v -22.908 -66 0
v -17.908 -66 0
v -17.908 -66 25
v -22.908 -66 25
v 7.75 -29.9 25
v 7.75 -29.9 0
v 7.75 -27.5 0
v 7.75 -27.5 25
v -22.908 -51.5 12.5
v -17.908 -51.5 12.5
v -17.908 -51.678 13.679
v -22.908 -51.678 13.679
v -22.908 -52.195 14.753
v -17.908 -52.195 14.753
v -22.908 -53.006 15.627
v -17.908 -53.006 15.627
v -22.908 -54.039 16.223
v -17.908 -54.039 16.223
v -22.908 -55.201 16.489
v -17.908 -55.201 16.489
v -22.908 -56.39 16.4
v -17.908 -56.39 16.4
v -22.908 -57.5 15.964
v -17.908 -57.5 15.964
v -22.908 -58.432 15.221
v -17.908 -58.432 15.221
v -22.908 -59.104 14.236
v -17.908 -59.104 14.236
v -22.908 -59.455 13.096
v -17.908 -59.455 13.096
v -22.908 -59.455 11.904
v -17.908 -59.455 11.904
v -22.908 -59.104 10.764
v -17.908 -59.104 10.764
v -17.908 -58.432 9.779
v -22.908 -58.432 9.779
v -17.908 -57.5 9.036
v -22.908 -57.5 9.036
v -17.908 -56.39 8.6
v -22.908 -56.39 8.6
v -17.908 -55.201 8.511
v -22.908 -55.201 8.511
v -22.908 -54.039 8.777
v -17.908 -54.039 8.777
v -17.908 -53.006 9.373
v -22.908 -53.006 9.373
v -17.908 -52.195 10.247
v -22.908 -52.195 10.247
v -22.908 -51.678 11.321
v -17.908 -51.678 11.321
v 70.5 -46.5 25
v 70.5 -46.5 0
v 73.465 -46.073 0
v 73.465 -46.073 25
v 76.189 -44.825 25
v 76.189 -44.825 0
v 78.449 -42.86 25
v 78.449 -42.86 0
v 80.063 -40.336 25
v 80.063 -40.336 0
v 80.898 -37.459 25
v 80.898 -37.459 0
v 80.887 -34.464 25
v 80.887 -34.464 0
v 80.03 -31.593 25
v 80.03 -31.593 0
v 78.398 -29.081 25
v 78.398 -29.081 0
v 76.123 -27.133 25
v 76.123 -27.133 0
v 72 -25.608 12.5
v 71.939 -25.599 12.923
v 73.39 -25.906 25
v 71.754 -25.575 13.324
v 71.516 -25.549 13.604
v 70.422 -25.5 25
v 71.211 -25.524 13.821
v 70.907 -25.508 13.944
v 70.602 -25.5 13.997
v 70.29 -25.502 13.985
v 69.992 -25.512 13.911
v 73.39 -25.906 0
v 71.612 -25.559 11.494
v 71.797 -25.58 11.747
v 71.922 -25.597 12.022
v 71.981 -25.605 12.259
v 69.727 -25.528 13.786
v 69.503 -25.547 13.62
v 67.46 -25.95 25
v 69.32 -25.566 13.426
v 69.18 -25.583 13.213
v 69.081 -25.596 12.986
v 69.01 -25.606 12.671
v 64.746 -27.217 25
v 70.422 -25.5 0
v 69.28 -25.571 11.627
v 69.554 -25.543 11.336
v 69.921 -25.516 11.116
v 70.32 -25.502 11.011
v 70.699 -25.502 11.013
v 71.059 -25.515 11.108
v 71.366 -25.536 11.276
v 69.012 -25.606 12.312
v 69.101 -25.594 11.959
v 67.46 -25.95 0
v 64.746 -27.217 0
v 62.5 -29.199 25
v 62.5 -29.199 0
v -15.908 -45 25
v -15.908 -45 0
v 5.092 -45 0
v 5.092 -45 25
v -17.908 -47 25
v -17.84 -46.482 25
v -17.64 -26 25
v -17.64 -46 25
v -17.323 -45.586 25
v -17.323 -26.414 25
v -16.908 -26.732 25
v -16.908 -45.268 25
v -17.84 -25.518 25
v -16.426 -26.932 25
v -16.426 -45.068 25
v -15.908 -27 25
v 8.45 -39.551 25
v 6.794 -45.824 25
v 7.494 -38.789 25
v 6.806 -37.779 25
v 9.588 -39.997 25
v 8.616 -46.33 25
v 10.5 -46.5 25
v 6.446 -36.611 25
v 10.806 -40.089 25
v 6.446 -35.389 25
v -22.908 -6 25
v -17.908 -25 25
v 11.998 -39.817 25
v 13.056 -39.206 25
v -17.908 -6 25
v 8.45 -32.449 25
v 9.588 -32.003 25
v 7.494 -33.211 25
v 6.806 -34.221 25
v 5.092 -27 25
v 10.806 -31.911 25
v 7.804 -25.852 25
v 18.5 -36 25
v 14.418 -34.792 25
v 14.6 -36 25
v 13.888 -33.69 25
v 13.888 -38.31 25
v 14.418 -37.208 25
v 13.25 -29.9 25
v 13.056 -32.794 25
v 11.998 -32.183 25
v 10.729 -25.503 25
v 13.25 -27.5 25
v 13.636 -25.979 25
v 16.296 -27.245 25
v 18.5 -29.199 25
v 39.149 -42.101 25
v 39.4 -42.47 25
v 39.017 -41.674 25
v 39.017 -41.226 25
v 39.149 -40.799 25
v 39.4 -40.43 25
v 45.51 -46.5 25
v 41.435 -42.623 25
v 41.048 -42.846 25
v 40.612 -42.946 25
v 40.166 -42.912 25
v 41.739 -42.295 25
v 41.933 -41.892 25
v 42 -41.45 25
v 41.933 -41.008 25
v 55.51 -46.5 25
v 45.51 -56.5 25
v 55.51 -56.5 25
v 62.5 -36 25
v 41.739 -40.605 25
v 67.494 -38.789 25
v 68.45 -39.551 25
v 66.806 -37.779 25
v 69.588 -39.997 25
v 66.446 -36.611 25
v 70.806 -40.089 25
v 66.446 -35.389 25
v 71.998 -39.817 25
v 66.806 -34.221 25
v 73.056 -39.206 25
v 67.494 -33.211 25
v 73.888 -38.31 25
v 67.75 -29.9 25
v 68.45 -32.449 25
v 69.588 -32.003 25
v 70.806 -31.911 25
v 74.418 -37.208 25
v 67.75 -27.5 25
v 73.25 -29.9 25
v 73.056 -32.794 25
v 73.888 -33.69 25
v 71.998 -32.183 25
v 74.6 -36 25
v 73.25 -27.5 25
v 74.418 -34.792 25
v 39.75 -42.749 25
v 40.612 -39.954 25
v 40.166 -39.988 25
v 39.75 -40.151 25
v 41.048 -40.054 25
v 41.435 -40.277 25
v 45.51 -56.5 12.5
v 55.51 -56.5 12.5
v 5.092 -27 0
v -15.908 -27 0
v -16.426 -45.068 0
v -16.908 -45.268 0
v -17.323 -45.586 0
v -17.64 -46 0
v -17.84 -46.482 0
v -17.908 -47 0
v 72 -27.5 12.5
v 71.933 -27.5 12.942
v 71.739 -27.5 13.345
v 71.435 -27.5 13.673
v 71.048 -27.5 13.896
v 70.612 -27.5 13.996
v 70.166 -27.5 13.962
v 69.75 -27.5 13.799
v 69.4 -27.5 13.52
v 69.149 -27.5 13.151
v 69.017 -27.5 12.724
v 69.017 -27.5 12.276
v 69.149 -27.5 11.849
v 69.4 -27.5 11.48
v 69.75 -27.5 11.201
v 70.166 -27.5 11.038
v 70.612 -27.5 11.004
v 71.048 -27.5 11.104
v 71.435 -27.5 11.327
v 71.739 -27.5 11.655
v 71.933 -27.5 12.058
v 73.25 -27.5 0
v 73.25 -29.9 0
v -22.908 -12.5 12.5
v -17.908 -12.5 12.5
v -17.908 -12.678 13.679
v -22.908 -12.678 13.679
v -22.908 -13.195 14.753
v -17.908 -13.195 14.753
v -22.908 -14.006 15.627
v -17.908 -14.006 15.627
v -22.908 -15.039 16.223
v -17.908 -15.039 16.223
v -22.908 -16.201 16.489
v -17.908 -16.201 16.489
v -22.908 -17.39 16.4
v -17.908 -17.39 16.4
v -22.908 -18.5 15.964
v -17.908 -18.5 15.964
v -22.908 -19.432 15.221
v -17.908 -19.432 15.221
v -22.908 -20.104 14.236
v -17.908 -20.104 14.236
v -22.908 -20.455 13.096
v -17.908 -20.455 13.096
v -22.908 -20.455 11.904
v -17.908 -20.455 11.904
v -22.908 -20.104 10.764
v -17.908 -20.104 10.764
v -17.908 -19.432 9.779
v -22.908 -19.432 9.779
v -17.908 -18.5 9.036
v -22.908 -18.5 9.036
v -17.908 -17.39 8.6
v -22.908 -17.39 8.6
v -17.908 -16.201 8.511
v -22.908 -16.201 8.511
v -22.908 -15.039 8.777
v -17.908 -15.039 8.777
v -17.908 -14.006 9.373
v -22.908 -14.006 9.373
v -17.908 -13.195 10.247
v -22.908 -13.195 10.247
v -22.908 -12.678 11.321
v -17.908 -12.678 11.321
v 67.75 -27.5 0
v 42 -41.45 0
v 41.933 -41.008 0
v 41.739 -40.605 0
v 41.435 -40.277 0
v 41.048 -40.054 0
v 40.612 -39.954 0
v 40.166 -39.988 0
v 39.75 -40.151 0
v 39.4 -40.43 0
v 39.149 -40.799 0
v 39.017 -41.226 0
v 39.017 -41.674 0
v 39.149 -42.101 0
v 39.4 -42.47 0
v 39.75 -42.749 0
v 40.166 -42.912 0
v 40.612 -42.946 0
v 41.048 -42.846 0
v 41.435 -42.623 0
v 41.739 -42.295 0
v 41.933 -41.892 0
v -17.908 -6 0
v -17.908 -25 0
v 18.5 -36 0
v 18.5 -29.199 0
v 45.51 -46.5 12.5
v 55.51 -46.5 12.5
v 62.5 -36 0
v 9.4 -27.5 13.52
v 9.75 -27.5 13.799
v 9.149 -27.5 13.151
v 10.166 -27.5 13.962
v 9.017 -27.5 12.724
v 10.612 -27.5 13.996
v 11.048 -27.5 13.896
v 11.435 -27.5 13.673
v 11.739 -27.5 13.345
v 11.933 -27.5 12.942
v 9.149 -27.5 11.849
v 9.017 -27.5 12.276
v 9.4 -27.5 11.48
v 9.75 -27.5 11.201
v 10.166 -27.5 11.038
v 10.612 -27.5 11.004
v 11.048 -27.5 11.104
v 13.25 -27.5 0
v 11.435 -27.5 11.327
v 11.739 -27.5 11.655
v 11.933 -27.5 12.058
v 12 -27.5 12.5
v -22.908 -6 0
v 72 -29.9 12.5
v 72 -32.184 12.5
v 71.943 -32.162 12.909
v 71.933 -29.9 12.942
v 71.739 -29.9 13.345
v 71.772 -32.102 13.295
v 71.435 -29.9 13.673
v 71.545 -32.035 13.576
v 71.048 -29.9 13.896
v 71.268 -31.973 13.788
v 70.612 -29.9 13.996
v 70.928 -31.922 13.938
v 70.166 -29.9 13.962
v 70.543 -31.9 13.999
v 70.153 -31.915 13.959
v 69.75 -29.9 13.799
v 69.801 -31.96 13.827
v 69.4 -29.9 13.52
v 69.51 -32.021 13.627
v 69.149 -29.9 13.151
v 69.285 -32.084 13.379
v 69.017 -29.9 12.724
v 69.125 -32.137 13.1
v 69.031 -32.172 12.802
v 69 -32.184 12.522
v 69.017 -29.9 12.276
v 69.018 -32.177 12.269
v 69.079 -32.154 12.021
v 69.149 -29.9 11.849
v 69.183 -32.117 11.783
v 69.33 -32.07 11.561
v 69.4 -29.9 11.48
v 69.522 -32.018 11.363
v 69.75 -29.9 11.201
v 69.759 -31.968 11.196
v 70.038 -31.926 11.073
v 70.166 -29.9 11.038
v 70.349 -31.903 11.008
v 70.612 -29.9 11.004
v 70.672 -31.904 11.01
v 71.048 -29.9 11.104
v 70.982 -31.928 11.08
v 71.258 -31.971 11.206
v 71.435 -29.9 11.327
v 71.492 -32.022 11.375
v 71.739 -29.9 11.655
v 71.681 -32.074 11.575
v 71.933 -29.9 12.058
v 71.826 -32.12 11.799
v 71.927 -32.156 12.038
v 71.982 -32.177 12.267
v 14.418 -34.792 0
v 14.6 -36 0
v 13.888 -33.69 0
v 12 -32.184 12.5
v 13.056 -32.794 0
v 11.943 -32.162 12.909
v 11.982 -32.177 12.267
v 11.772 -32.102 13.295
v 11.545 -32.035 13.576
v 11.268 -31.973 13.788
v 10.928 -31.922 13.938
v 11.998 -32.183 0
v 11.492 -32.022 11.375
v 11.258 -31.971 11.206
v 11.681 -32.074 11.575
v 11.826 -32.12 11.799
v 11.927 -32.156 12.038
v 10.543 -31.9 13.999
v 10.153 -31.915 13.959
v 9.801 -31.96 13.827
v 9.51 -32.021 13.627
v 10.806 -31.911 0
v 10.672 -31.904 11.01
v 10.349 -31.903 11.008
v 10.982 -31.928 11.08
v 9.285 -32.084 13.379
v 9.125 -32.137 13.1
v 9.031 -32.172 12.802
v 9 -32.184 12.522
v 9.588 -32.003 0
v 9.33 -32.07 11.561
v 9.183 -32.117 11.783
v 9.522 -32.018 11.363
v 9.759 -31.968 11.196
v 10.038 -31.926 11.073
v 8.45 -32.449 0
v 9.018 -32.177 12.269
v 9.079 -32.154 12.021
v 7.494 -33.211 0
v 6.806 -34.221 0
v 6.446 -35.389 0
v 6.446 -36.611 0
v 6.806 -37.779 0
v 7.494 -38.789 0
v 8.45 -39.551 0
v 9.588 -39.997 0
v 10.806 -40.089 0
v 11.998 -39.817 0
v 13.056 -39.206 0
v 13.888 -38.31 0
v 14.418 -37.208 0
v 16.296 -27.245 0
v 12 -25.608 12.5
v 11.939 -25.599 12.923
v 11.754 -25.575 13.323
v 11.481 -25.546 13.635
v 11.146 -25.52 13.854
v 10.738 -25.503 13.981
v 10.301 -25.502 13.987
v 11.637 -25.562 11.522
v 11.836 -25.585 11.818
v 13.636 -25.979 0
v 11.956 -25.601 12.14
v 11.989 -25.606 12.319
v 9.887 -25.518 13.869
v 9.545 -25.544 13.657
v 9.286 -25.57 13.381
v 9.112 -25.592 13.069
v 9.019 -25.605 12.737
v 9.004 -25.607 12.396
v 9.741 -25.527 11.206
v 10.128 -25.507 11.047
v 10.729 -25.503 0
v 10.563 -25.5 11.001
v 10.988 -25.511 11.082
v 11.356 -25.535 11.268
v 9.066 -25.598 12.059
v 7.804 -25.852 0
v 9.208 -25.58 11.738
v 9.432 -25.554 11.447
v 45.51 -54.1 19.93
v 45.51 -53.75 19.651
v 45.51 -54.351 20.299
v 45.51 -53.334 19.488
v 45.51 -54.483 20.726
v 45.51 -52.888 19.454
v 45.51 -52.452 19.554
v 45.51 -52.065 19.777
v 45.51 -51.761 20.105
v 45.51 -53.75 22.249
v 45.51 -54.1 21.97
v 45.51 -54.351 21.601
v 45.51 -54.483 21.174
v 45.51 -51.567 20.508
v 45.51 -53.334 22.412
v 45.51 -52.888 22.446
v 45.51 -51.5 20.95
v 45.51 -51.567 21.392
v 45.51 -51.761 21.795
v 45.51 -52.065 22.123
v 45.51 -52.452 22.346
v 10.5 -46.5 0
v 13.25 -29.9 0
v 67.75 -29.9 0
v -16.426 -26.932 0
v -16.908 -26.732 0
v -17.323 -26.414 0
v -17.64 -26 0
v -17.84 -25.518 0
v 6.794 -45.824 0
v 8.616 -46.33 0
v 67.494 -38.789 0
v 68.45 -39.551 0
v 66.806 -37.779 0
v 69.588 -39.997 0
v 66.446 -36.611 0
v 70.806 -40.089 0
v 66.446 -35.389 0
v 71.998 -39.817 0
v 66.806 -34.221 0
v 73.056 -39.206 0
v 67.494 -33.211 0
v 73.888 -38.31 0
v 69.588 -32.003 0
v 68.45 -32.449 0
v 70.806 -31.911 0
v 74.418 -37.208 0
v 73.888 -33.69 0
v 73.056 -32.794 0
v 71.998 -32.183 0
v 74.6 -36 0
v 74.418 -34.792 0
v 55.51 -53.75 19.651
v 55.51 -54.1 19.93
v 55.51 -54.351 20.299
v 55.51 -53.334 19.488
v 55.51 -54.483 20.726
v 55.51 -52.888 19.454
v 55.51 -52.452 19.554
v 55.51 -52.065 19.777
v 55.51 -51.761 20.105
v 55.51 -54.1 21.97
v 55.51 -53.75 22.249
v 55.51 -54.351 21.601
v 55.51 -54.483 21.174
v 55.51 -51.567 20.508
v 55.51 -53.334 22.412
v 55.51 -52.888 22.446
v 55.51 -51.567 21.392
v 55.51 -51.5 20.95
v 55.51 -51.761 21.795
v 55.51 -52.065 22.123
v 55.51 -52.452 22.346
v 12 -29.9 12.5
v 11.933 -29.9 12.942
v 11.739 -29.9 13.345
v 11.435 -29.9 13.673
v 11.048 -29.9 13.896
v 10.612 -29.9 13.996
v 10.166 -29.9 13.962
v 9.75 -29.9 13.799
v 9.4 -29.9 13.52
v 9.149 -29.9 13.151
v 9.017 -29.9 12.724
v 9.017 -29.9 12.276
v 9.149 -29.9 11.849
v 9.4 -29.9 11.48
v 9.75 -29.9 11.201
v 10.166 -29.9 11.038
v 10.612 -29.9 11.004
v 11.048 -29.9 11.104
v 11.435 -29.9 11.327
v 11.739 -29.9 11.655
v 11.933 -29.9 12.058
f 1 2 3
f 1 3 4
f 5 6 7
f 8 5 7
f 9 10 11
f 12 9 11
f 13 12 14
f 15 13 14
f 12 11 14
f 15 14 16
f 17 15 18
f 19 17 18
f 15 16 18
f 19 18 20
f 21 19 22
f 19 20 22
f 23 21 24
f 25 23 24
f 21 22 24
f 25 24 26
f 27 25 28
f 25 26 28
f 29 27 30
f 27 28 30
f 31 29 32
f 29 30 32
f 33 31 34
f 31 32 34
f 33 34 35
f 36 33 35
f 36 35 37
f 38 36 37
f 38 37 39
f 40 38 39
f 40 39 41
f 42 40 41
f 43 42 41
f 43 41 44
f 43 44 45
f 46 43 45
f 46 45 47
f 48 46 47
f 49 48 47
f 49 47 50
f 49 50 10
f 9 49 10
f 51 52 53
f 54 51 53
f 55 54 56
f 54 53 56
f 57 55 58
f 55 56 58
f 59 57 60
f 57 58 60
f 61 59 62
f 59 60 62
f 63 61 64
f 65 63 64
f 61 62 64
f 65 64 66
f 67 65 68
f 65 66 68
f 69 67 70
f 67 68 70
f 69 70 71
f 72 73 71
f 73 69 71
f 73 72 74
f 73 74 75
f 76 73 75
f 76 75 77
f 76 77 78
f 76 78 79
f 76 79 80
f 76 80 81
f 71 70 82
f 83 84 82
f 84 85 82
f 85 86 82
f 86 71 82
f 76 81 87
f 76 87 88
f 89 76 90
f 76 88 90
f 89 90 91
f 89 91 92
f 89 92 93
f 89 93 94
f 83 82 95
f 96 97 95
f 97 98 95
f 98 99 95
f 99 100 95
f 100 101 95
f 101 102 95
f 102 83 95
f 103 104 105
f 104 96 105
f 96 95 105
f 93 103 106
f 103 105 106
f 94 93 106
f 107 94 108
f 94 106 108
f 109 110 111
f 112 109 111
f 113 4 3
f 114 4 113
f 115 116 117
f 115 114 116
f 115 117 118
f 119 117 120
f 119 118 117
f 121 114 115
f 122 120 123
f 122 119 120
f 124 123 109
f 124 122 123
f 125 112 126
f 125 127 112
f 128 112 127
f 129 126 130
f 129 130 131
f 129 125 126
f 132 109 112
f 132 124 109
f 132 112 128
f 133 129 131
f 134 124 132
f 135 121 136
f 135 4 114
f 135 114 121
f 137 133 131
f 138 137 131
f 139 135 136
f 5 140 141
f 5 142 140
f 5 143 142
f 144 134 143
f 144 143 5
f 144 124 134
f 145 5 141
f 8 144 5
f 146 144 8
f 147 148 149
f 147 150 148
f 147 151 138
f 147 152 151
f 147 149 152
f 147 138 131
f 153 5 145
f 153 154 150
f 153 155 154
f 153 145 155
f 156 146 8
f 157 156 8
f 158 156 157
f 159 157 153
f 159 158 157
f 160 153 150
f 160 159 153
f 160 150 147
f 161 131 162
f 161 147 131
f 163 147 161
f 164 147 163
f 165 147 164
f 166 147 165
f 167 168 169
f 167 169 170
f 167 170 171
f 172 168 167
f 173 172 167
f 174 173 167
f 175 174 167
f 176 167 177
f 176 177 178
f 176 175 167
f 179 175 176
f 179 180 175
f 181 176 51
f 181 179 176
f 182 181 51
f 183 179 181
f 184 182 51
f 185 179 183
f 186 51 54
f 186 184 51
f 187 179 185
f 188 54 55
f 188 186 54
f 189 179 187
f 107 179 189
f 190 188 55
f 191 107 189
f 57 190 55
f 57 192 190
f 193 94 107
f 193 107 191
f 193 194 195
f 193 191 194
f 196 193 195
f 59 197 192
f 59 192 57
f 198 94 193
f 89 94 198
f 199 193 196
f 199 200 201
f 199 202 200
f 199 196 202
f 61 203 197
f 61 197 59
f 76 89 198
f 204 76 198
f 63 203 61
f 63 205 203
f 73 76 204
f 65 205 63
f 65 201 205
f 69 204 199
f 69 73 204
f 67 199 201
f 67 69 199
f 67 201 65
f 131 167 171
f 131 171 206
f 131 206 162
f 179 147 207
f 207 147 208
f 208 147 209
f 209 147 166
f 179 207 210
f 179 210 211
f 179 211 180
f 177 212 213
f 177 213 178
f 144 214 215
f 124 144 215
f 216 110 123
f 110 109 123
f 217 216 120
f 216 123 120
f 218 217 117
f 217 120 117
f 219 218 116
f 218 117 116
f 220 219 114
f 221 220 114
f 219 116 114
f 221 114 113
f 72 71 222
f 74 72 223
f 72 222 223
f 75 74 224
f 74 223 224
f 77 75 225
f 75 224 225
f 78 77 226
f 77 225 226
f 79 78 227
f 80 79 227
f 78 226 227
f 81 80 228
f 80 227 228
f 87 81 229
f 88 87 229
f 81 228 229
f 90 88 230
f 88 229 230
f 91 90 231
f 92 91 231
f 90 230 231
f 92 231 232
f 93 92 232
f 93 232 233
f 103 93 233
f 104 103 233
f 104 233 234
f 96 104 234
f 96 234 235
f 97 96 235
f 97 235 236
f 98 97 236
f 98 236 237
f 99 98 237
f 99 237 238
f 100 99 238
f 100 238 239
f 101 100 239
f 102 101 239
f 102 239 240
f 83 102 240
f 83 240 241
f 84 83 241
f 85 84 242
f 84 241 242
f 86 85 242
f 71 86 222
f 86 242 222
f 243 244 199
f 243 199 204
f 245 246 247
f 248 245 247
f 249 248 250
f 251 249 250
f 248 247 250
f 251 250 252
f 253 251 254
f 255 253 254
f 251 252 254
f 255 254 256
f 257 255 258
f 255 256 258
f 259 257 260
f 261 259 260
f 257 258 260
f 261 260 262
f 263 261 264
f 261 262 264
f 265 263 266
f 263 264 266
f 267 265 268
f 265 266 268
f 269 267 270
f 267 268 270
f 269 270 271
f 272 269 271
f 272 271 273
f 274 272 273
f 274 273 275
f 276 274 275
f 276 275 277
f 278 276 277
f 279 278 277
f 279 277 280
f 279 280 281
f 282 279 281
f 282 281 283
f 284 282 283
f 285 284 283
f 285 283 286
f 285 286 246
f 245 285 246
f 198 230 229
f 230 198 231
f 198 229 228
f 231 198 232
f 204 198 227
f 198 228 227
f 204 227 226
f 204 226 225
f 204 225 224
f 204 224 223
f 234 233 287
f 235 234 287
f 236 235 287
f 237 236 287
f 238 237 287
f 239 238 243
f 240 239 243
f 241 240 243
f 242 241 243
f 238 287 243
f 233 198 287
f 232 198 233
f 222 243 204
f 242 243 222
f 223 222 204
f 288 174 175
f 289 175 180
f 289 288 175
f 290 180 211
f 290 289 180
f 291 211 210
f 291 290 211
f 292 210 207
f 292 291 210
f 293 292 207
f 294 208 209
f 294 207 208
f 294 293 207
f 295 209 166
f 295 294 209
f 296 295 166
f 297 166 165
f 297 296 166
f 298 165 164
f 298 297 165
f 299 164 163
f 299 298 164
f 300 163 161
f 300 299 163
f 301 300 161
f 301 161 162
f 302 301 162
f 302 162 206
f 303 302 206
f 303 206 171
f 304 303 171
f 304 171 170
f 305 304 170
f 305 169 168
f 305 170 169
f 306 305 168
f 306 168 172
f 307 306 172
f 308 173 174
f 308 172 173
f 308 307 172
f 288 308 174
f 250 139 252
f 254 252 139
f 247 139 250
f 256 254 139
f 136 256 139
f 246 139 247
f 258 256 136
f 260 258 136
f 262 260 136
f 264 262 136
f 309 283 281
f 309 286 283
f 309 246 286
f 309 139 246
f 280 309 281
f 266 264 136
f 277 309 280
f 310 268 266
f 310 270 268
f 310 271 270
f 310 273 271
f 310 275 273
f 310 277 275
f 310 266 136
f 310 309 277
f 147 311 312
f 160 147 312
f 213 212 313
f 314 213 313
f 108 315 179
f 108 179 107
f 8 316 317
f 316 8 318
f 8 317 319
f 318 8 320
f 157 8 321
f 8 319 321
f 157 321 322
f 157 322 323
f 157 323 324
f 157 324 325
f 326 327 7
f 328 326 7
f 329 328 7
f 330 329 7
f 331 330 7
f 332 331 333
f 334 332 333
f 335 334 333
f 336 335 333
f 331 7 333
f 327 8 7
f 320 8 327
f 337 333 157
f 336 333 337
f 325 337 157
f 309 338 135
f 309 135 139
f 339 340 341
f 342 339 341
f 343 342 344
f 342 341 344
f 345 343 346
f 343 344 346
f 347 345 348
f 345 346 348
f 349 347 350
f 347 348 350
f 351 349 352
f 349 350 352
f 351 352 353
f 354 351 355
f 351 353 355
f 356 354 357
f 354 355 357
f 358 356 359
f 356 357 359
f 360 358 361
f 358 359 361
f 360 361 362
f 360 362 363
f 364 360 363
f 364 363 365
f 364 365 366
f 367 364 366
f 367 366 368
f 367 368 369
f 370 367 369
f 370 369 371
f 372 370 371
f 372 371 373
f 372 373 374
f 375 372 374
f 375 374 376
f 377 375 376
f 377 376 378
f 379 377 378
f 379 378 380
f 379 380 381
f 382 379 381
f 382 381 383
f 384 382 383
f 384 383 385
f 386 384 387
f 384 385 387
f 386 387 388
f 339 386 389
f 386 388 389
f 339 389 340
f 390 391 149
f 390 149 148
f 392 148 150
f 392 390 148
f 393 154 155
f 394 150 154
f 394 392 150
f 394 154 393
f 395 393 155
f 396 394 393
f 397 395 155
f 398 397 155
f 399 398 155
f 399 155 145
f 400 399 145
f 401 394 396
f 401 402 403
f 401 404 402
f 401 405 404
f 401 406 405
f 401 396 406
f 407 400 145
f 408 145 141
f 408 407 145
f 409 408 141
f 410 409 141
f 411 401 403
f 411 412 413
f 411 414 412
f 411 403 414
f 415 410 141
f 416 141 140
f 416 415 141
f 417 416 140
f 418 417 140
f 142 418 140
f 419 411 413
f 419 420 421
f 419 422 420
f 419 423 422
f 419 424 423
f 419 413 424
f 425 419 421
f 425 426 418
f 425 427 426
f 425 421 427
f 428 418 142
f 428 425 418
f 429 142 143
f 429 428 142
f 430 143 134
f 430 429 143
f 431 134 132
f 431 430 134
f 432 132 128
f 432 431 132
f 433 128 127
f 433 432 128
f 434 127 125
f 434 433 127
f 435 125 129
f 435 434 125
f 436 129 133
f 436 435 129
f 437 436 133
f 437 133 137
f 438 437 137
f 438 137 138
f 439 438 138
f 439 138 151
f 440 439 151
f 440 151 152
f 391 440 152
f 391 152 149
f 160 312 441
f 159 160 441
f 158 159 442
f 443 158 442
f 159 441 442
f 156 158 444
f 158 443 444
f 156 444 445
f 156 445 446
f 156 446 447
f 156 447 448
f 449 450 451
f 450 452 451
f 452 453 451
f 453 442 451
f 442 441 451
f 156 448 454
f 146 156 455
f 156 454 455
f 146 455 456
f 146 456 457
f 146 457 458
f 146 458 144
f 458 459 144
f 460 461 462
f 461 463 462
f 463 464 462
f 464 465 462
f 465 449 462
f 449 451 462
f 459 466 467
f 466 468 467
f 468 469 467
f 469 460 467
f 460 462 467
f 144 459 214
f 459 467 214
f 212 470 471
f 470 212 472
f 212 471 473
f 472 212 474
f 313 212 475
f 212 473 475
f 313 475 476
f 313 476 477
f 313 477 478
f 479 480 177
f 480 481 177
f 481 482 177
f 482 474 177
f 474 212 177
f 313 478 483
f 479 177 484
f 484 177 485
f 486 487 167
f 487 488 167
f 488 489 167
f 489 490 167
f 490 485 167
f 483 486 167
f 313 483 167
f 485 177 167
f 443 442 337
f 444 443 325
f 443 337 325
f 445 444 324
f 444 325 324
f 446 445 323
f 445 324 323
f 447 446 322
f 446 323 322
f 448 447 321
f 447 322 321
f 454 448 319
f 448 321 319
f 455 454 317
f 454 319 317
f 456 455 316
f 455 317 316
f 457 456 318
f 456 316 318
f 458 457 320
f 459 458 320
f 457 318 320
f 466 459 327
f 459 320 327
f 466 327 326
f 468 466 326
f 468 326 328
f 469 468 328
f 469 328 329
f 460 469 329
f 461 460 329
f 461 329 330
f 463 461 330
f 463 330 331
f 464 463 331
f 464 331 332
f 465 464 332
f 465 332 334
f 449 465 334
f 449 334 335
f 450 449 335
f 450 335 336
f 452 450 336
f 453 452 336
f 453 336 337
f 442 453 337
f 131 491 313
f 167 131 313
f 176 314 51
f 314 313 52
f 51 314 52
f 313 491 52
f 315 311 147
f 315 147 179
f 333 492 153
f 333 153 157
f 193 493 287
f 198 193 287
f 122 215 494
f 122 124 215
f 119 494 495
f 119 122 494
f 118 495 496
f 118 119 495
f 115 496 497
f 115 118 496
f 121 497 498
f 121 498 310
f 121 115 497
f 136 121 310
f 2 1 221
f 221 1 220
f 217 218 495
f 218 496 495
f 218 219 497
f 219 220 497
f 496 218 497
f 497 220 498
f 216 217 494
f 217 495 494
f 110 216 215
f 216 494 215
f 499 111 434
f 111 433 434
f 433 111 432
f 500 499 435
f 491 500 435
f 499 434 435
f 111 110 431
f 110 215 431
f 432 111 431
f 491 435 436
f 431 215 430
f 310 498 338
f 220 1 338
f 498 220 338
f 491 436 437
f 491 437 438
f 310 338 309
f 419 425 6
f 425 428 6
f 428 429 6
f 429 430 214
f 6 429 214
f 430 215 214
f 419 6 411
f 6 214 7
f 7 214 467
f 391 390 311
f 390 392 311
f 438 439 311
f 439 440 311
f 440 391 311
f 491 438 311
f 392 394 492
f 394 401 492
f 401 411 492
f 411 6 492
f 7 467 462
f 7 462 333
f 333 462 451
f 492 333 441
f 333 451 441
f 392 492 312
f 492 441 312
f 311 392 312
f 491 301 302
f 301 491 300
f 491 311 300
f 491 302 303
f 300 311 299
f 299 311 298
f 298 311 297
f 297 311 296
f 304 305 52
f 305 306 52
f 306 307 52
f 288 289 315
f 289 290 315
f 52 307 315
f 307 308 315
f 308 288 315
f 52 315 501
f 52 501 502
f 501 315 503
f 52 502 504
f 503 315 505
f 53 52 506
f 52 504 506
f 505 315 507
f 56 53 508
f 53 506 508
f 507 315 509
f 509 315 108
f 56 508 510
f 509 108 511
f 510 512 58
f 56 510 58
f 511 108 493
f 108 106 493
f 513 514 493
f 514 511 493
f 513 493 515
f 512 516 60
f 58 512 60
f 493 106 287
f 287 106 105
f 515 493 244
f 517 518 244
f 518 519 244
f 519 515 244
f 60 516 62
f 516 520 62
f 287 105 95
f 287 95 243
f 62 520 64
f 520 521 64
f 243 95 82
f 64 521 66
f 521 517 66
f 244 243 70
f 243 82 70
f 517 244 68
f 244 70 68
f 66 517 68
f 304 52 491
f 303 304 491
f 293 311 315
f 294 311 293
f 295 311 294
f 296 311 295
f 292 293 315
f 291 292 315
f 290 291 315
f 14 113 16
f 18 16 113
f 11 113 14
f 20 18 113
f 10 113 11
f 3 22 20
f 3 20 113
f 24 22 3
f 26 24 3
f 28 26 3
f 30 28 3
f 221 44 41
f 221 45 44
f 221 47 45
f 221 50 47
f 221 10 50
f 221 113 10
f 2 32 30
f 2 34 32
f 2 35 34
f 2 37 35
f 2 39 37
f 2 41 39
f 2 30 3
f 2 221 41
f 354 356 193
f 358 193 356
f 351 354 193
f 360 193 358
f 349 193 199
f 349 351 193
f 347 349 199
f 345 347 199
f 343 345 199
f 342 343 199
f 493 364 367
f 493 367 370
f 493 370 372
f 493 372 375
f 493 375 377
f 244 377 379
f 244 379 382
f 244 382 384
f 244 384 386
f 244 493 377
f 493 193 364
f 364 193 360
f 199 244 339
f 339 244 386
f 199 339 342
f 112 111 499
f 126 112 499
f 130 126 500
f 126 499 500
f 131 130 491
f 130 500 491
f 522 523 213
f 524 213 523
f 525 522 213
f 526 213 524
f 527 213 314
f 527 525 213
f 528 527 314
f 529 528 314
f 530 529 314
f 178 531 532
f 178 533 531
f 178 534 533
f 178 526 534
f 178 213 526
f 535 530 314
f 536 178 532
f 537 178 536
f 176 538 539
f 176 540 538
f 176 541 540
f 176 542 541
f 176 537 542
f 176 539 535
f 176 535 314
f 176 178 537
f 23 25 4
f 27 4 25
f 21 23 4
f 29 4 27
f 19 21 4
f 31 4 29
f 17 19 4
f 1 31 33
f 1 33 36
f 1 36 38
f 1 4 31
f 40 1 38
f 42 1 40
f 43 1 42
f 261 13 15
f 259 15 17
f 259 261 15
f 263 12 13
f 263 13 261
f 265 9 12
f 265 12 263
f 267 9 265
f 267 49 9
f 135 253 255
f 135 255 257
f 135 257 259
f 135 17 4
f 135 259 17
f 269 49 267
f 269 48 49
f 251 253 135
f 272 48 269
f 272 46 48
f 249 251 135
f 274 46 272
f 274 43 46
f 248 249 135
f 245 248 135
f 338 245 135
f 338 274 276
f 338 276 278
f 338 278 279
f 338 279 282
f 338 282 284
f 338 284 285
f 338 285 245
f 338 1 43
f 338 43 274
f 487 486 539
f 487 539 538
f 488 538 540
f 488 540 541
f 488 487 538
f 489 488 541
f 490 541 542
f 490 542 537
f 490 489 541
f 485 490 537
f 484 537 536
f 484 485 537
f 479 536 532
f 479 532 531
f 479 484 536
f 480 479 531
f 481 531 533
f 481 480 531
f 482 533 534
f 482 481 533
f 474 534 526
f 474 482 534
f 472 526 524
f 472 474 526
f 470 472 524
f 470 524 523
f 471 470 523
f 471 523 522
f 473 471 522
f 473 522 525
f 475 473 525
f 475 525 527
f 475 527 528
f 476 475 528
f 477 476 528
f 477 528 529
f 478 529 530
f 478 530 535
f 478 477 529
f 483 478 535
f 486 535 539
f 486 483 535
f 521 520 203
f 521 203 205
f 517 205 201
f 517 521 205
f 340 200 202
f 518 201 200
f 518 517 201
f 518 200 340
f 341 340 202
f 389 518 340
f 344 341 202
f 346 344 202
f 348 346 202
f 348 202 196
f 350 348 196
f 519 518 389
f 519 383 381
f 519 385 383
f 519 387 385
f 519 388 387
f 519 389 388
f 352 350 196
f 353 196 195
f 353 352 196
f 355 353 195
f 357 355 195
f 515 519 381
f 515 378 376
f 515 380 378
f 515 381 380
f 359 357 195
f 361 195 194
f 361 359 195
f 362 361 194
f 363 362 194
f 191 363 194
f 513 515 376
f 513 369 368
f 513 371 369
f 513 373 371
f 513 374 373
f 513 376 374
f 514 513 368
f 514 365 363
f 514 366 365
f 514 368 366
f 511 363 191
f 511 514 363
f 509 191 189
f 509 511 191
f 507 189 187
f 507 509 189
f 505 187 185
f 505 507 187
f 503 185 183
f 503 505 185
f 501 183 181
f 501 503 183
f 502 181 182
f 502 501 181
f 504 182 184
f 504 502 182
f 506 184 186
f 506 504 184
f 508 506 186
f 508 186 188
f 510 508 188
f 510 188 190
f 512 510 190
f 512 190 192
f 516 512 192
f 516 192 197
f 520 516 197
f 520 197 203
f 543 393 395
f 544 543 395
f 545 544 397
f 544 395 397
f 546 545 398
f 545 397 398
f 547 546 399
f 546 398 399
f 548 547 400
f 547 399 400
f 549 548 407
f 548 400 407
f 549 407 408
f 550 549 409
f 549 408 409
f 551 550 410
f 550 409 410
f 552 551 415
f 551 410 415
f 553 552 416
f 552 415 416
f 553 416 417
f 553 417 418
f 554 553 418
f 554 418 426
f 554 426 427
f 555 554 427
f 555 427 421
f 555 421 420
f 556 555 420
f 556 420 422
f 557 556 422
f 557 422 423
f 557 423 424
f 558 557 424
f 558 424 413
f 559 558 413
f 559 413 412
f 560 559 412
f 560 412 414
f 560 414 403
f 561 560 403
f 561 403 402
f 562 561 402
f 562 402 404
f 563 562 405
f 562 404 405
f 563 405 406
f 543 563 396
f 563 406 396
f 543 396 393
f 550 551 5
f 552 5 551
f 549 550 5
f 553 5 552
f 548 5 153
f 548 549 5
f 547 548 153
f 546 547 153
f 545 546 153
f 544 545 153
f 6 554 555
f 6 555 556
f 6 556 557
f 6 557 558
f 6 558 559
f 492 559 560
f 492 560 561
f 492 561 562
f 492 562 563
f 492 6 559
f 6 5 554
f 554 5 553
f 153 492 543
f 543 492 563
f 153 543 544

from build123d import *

# Parameters (mm, degrees)
SKETCH005_R          = 4.1
PAD004_DEPTH         = 25
SKETCH010_W          = 44
SKETCH010_H          = 50
POCKET003_DEPTH      = 25
PAD008_DEPTH         = 25
SKETCH018_W          = 10
SKETCH018_H          = 12.5
SKETCH018_R          = 1.5
PAD009_DEPTH         = 10
SKETCH019_R          = 1.5
POCKET009_DEPTH      = 0.001
POCKET009_DEPTH_BACK = 25.001
SKETCH020_W          = 5.5
SKETCH020_H          = 2.4
POCKET010_DEPTH      = 0.001
POCKET010_DEPTH_BACK = 25.001
SKETCH021_R          = 1.5
POCKET011_DEPTH      = 30.001
SKETCH043_R          = 4
POCKET027_DEPTH      = 22.9093269132
FILLET_R             = 2


with BuildPart() as part:
    # Sketch005 → Pad004 (new body)
    with BuildSketch(Plane.XY):
        with BuildLine():
            ThreePointArc((21, 0), (3.0753787975, 7.4246212025), (10.5, -10.5))
            Line((10.5, -10.5), (70.5, -10.5))
            ThreePointArc((70.5, -10.5), (77.9246212025, 7.4246212025), (60, 0))
            Line((21, 0), (60, 0))
        make_face()
        with Locations((10.5, 0)):
            Circle(SKETCH005_R, mode=Mode.SUBTRACT)
        with Locations((70.5, 0)):
            Circle(SKETCH005_R, mode=Mode.SUBTRACT)
    extrude(amount=PAD004_DEPTH)

    # Sketch010 → Pocket003 (cut)
    with BuildSketch(Plane.XY):
        with Locations((40.5, 25)):
            Rectangle(SKETCH010_W, SKETCH010_H)
    extrude(amount=POCKET003_DEPTH, mode=Mode.SUBTRACT)

    # Sketch017 → Pad008 (join)
    with BuildSketch(Plane.XY):
        with BuildLine():
            Line((5.0916730868, 9), (-17.9083269132, 9))
            Line((-17.9083269132, 30), (-17.9083269132, 9))
            Line((-22.9083269132, 30), (-17.9083269132, 30))
            Line((-22.9083269132, -30), (-22.9083269132, 30))
            Line((-17.9083269132, -30), (-22.9083269132, -30))
            Line((-17.9083269132, -9), (-17.9083269132, -30))
            Line((-17.9083269132, -9), (5.0916730868, -9))
            ThreePointArc((5.0916730868, 9), (0, 0), (5.0916730868, -9))
        make_face()
    extrude(amount=PAD008_DEPTH)

    # Sketch018 → Pad009 (join)
    with BuildSketch(Plane.YZ.offset(45.51)):
        with Locations((-15.5, 18.75)):
            Rectangle(SKETCH018_W, SKETCH018_H)
        with Locations((-17, 20.95)):
            Circle(SKETCH018_R, mode=Mode.SUBTRACT)
    extrude(amount=PAD009_DEPTH)

    # Sketch019 → Pocket009 (cut, two sides)
    with BuildSketch(Plane.XY) as pocket009_sk:
        with Locations((40.5, -5.45)):
            Circle(SKETCH019_R)
    extrude(amount=-POCKET009_DEPTH, mode=Mode.SUBTRACT)
    extrude(pocket009_sk.sketch, amount=POCKET009_DEPTH_BACK, mode=Mode.SUBTRACT)

    # Sketch020 → Pocket010 (cut, two sides)
    with BuildSketch(Plane.XY) as pocket010_sk:
        with Locations((10.5, 7.3)):
            Rectangle(SKETCH020_W, SKETCH020_H)
        with Locations((70.5, 7.3)):
            Rectangle(SKETCH020_W, SKETCH020_H)
    extrude(amount=-POCKET010_DEPTH, mode=Mode.SUBTRACT)
    extrude(pocket010_sk.sketch, amount=POCKET010_DEPTH_BACK, mode=Mode.SUBTRACT)

    # Sketch021 → Pocket011 (cut, through all)
    with BuildSketch(Plane.XZ):
        with Locations((10.5, 12.5)):
            Circle(SKETCH021_R)
        with Locations((70.5, 12.5)):
            Circle(SKETCH021_R)
    extrude(amount=-POCKET011_DEPTH, mode=Mode.SUBTRACT)

    # Sketch043 → Pocket027 (cut, through all)
    with BuildSketch(Plane.YZ):
        with Locations((-19.5, 12.5)):
            Circle(SKETCH043_R)
        with Locations((19.5, 12.5)):
            Circle(SKETCH043_R)
    extrude(amount=-POCKET027_DEPTH, mode=Mode.SUBTRACT)

    # Fillet
    fillet_edges = [part.edges().sort_by_distance(p)[0] for p in [
        (-17.908327, 9, 12.5),
        (-17.908327, -9, 12.5),
    ]]
    fillet(fillet_edges, radius=FILLET_R)


with BuildPart() as part_1:
    # Body004 placement: moved
    add(part.part.moved(Location((0, -36, 0))))


solid = part_1.part
